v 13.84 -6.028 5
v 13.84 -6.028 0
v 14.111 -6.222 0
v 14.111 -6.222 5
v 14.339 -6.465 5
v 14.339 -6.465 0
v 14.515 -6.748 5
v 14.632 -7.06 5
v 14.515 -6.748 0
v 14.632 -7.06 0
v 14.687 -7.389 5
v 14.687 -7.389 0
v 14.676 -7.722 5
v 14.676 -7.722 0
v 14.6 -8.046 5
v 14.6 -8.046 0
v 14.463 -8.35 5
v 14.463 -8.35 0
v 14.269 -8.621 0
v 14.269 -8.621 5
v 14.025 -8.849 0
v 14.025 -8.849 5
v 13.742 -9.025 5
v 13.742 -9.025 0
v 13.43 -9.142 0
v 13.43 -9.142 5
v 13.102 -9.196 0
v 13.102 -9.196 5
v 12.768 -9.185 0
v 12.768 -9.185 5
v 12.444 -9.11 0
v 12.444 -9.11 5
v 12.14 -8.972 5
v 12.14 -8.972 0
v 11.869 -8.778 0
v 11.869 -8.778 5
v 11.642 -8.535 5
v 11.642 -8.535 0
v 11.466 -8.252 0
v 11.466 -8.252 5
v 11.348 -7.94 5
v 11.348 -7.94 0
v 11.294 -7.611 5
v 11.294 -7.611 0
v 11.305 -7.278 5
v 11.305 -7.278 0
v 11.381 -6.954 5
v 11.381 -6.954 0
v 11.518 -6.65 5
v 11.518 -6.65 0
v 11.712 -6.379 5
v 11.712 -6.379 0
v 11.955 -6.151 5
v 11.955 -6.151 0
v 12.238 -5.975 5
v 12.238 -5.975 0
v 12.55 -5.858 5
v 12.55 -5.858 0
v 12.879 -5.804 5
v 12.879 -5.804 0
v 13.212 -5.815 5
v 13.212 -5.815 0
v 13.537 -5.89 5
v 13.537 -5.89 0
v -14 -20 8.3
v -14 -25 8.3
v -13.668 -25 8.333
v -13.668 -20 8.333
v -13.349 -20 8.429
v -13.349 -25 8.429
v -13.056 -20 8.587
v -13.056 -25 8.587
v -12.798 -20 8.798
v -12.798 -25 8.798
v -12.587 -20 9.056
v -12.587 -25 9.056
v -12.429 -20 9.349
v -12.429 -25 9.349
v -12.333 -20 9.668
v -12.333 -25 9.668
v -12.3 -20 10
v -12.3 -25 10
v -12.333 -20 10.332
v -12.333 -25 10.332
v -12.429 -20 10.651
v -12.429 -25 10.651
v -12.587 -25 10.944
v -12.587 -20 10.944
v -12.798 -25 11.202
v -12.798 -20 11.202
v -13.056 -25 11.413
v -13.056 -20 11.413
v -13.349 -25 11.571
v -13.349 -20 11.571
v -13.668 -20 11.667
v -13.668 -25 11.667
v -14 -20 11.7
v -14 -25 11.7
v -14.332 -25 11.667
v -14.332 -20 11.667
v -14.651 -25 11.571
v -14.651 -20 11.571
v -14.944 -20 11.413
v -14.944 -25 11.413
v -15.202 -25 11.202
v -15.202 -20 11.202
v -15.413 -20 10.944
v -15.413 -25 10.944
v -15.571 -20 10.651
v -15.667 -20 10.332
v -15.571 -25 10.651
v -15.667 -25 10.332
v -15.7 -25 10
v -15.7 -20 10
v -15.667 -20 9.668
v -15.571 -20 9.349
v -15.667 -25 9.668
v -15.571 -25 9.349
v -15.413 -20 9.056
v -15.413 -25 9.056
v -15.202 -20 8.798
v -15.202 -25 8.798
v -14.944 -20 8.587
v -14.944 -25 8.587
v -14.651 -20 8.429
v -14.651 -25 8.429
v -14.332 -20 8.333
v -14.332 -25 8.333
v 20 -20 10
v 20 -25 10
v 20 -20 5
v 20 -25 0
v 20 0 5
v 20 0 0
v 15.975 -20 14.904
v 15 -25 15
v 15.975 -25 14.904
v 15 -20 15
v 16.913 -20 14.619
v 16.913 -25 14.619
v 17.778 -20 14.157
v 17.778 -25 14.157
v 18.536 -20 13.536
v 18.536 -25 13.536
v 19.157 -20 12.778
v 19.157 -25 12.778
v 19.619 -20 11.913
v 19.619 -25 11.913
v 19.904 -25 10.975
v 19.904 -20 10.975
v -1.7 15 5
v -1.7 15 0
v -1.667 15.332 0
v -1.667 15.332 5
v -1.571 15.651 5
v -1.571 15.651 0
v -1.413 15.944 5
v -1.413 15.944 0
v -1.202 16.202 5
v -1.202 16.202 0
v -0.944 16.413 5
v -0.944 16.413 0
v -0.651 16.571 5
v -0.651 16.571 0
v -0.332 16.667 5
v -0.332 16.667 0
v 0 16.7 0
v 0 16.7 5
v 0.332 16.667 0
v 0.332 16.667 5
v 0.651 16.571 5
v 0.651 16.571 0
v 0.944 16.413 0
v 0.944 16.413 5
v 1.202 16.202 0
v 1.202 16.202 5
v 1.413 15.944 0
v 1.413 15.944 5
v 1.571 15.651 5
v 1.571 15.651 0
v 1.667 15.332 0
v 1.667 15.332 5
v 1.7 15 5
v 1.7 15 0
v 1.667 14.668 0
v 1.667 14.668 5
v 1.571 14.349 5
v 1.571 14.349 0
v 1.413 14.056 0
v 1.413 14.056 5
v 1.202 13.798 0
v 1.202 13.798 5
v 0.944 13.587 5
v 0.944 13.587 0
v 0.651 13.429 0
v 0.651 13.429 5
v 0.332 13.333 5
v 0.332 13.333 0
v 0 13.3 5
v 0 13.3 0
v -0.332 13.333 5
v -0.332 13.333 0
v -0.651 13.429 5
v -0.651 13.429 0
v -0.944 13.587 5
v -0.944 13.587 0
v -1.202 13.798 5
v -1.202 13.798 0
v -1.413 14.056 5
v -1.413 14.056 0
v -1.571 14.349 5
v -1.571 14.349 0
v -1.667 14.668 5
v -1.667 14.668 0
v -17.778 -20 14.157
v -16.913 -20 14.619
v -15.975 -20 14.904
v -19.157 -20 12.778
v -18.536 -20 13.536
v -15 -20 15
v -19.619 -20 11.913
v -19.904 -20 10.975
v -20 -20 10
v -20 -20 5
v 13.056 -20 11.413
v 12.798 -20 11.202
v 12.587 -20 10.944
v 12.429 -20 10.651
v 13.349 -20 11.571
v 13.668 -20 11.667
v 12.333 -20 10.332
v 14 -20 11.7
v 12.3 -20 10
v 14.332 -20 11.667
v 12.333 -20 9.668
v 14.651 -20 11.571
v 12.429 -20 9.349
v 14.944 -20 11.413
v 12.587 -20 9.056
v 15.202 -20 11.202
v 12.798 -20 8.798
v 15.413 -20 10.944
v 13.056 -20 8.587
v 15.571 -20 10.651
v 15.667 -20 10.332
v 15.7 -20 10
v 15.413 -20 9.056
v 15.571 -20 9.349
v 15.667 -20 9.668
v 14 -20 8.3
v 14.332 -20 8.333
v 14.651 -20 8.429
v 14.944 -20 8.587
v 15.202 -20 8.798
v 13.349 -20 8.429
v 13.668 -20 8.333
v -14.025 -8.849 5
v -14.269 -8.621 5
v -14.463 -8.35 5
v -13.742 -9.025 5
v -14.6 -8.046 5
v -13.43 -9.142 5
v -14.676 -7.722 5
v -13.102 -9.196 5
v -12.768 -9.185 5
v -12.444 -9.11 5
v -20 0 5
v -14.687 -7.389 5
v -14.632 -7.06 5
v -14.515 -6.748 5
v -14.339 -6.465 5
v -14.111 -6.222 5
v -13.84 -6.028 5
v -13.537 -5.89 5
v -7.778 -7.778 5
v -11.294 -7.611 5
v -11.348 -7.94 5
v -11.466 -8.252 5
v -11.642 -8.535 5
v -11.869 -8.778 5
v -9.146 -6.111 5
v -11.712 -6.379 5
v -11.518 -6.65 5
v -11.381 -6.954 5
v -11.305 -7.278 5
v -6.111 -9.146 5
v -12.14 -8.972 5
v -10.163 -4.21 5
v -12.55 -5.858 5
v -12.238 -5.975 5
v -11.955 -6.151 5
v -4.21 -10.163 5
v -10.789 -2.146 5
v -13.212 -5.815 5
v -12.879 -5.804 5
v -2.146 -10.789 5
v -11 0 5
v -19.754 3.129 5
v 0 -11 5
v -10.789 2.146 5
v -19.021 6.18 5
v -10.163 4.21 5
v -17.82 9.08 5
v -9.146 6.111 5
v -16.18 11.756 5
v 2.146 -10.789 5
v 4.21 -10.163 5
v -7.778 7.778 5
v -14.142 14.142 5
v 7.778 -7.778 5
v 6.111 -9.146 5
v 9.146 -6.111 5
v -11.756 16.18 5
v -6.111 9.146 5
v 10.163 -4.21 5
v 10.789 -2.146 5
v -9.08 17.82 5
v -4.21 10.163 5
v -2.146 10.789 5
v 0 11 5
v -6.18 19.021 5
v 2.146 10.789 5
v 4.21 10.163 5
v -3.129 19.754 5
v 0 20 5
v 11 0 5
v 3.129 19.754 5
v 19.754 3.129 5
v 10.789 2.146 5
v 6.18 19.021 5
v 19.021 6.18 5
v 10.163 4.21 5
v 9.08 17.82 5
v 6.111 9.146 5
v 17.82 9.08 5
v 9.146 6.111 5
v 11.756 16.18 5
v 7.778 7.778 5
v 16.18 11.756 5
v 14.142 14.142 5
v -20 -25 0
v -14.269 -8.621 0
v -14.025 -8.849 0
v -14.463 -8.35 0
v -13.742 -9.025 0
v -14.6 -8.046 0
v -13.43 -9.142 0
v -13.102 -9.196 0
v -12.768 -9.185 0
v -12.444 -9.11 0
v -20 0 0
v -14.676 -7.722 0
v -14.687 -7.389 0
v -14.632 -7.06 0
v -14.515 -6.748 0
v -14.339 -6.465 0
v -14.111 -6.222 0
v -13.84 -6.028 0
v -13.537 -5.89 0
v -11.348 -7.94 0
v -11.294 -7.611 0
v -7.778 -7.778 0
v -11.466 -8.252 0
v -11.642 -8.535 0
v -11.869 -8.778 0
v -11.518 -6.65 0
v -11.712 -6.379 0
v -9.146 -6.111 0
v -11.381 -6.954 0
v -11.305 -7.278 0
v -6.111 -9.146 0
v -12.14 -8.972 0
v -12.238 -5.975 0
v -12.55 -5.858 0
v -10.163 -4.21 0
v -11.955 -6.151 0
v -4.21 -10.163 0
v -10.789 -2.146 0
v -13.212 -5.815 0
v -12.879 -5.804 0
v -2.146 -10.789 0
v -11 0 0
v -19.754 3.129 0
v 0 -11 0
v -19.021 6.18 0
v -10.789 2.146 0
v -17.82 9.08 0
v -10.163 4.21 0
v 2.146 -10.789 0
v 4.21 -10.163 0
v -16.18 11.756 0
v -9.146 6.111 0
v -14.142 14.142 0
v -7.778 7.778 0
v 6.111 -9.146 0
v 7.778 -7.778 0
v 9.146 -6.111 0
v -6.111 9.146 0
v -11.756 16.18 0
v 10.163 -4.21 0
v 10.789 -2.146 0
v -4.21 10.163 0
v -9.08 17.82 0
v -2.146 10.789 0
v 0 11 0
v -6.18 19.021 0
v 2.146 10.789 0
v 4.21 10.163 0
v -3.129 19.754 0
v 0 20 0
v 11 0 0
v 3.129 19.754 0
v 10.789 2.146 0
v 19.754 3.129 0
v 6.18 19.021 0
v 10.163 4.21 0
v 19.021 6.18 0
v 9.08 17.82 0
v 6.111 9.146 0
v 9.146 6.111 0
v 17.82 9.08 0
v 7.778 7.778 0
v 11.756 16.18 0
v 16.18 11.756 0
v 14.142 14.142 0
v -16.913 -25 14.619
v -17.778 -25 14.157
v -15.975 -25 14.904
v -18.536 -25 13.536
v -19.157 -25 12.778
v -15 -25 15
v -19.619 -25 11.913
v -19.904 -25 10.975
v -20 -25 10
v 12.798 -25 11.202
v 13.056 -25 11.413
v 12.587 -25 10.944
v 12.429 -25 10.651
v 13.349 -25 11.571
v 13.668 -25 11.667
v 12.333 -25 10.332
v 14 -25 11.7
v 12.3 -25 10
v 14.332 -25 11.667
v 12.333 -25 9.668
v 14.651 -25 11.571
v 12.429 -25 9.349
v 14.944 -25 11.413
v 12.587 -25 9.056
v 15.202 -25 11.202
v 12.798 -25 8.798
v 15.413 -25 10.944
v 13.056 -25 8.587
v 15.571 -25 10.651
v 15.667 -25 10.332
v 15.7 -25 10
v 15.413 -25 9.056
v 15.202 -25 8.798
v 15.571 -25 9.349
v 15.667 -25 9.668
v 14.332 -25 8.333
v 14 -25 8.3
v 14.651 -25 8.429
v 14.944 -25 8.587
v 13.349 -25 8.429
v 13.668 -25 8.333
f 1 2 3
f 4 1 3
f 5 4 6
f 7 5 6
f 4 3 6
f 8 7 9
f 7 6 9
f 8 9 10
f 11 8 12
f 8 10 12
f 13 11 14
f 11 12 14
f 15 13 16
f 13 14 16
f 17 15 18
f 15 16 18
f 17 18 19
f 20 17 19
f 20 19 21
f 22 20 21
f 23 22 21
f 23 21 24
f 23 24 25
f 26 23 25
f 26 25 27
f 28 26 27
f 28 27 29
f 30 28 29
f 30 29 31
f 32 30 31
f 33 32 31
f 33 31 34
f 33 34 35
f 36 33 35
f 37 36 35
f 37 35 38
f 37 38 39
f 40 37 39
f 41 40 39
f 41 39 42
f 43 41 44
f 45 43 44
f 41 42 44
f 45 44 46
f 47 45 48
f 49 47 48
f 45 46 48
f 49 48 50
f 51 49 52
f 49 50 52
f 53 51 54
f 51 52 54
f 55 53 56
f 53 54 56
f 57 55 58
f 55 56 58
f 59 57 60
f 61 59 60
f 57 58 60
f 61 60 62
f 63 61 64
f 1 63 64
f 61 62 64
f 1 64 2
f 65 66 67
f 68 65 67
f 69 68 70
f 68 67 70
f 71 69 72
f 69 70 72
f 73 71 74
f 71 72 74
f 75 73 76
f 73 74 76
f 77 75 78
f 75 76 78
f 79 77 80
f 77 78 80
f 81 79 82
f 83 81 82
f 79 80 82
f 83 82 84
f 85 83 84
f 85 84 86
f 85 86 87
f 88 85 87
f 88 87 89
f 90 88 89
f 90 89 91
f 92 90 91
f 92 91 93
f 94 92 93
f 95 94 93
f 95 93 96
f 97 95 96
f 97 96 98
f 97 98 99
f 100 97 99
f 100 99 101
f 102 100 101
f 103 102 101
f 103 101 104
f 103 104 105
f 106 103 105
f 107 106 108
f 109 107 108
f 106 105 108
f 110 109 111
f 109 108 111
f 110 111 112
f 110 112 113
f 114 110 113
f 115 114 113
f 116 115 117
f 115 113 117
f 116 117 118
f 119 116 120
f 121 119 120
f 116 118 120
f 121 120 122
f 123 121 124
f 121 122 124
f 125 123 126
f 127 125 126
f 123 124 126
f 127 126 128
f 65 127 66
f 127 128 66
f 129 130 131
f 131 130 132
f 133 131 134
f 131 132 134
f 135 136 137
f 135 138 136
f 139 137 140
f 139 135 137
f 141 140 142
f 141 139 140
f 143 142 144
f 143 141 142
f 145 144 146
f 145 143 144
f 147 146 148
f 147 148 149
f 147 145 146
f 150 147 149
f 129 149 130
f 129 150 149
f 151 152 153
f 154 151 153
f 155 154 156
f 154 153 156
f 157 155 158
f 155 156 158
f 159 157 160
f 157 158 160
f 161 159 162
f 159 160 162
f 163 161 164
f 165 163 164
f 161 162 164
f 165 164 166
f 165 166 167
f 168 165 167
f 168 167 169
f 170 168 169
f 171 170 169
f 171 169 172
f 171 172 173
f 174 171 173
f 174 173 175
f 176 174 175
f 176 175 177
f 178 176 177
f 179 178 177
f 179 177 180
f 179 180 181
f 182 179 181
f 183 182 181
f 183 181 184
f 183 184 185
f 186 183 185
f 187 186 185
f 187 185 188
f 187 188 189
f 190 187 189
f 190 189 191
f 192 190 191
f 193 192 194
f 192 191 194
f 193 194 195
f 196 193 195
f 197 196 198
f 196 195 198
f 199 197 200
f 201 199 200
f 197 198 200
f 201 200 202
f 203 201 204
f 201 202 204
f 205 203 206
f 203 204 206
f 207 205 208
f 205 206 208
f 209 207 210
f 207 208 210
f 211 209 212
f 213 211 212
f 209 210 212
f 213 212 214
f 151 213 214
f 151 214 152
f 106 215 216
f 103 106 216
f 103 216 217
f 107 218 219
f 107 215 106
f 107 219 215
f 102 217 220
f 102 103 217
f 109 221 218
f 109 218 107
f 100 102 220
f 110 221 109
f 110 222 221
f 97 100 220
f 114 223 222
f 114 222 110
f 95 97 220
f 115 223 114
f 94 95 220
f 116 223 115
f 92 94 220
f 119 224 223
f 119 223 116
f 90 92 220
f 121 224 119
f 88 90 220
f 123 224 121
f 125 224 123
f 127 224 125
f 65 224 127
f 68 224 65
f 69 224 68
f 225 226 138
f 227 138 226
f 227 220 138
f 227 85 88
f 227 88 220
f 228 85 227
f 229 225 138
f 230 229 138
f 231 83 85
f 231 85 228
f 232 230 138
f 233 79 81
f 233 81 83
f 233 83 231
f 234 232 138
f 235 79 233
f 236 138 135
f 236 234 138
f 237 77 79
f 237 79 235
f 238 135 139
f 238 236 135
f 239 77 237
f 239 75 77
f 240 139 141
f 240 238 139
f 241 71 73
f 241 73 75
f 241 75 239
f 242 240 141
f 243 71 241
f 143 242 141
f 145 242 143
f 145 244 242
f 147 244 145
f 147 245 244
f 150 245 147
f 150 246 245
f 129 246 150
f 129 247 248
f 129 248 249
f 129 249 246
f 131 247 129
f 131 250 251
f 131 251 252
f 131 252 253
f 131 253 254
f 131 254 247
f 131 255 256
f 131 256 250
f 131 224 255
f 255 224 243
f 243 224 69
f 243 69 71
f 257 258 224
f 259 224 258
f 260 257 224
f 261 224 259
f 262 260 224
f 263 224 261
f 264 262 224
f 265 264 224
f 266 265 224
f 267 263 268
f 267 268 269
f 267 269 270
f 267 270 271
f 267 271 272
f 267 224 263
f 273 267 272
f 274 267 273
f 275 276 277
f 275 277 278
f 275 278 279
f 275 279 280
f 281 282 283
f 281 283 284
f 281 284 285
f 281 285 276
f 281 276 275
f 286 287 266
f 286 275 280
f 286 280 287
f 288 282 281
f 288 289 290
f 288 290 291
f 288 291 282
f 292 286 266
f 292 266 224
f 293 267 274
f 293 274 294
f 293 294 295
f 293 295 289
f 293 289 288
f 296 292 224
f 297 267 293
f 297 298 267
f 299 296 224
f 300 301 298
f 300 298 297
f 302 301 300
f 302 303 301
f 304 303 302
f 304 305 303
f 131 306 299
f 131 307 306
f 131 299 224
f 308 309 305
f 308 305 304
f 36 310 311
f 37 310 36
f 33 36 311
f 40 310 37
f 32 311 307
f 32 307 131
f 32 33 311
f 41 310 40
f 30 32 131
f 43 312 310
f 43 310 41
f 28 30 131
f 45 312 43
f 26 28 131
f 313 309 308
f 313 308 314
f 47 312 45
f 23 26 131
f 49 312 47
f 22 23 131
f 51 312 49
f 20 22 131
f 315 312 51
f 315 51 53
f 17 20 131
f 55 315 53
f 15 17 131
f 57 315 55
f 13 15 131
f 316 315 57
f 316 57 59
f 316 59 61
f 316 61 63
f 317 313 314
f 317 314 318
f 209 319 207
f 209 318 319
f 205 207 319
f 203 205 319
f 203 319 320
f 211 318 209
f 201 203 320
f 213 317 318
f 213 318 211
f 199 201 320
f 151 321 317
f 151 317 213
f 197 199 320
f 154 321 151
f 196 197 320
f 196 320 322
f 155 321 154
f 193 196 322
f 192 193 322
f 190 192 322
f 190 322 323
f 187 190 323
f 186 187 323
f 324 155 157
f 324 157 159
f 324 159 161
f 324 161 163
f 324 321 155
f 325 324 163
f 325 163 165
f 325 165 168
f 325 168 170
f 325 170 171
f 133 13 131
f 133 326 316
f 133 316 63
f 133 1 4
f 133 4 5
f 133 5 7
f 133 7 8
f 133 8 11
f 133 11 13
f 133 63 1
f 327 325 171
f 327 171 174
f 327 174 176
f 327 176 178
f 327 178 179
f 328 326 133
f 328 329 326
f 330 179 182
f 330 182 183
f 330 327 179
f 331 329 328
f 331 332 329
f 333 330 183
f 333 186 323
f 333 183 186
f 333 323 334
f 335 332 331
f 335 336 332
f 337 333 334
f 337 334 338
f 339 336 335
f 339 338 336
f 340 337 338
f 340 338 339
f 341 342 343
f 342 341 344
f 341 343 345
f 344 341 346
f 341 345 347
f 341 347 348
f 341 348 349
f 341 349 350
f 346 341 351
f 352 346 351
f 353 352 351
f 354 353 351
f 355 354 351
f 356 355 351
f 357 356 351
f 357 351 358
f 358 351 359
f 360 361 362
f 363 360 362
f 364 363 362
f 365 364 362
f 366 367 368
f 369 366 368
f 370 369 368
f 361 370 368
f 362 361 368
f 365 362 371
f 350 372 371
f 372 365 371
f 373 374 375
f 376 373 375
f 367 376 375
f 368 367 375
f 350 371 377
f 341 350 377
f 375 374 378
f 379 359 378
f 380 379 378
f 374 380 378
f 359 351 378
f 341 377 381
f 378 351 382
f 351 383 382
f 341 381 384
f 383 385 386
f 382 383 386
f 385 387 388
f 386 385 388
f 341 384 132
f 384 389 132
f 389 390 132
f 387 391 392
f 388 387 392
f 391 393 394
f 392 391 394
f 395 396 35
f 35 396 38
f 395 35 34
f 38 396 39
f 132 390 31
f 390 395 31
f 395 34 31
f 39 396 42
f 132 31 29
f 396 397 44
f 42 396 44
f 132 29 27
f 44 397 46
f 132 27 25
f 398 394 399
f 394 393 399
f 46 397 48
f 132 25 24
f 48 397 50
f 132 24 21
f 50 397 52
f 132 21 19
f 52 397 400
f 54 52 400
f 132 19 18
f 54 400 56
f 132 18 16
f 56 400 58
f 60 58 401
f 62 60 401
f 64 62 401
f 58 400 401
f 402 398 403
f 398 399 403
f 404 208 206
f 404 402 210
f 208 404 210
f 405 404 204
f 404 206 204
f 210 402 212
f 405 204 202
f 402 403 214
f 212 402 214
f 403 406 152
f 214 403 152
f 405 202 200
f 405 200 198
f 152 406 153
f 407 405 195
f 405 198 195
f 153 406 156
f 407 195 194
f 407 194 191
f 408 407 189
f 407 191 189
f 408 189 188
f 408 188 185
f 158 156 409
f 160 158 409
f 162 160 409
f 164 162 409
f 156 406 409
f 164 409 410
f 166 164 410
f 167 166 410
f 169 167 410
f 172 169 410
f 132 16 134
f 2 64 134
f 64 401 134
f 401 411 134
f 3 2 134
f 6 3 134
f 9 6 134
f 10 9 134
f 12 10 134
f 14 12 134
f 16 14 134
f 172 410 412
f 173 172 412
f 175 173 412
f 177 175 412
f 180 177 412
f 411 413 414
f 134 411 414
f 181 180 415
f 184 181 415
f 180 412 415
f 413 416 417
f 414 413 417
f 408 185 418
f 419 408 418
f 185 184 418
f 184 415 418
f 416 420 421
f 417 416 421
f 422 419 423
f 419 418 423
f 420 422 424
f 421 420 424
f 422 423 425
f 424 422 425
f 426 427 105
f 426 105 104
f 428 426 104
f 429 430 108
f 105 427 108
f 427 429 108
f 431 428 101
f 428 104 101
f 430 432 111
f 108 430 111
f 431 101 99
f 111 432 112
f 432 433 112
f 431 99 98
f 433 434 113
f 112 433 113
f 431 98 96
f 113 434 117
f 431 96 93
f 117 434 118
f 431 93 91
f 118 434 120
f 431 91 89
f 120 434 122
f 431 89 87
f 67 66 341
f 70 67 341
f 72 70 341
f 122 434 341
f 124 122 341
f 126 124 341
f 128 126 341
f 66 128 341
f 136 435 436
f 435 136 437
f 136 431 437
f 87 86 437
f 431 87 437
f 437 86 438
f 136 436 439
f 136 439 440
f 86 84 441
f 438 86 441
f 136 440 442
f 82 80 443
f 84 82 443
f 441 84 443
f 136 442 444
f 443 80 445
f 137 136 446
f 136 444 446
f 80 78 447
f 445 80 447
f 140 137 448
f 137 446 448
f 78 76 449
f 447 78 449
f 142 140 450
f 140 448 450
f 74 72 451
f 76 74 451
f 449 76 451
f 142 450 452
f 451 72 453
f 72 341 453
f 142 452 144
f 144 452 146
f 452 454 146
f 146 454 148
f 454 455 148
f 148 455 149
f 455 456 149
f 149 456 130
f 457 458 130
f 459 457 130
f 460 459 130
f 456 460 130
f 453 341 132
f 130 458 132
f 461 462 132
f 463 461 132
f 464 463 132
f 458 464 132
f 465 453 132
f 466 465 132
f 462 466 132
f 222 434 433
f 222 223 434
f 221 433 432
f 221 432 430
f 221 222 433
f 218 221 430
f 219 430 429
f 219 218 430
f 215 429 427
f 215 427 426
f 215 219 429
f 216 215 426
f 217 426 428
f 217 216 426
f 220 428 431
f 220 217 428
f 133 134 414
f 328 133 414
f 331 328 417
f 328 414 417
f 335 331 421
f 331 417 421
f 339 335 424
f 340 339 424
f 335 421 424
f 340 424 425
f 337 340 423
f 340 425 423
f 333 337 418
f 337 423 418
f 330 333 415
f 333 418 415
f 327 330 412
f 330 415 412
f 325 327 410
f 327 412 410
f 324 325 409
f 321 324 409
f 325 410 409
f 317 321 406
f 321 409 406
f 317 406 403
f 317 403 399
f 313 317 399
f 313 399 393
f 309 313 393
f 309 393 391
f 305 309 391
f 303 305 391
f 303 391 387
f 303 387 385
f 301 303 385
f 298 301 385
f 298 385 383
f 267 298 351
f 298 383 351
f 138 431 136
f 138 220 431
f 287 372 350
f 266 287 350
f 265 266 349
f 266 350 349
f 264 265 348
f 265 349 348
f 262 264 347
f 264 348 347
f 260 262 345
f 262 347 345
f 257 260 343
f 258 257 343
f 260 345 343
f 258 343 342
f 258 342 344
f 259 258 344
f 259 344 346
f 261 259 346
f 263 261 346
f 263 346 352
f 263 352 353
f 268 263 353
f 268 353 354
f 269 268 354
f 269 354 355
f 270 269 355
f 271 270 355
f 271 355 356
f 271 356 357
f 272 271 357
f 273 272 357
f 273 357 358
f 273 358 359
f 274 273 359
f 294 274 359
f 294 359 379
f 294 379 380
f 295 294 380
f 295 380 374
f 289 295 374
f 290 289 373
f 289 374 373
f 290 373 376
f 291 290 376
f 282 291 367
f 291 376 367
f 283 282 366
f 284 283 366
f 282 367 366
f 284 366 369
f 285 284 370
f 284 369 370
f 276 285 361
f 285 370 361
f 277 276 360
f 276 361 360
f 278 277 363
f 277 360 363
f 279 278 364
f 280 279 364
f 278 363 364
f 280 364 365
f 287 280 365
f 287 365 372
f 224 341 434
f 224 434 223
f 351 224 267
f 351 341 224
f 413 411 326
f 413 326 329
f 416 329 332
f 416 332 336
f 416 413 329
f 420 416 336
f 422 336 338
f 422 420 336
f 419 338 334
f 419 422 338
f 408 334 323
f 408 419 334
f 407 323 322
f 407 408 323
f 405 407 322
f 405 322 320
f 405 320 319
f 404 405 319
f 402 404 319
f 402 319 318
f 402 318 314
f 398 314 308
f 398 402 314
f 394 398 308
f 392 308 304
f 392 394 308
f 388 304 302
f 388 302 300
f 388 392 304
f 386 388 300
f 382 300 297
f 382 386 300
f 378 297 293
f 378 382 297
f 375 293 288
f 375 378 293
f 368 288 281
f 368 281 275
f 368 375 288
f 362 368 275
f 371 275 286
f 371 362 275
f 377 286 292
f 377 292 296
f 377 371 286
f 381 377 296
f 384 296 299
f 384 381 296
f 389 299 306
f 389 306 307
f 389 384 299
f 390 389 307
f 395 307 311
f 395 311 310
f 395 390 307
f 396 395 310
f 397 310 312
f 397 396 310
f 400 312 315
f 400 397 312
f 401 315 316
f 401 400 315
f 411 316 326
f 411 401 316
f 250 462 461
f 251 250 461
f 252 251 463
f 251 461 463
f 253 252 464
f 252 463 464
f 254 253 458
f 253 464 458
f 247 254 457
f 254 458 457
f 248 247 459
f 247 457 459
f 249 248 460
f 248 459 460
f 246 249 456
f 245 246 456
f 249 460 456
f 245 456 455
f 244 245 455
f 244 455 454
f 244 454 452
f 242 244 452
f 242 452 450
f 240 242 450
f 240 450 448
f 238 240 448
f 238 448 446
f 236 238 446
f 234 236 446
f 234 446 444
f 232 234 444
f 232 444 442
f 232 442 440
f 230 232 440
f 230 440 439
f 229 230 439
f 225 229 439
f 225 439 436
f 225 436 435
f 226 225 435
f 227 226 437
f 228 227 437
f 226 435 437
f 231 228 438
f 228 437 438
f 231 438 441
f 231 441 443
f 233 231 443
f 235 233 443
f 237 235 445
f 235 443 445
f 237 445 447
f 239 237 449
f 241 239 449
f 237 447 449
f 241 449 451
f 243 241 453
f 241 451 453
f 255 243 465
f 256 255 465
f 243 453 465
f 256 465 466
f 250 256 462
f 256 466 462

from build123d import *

# Parameters (mm, degrees)
SKETCH1_R            = 11
BOSS_EXTRUDE1_DEPTH  = 5
M3_CLEARANCE_HOLE1_D = 3.4
CIRPATTERN1_COUNT    = 3
SKETCH5_W            = 40
SKETCH5_H            = 5
BOSS_EXTRUDE2_DEPTH  = 15
M3_CLEARANCE_HOLE3_D = 3.4
FILLET1_R            = 5


with BuildPart() as part:
    # Sketch1 → Boss-Extrude1 (new body)
    with BuildSketch(Plane.XY):
        with BuildLine():
            Line((-20, -4.3e-08), (-20, -20))
            Line((-20, -20), (20, -20))
            Line((20, -20), (20, 0))
            ThreePointArc((20, 0), (-2.2e-08, 20), (-20, -4.3e-08))
        make_face()
        Circle(SKETCH1_R, mode=Mode.SUBTRACT)
    extrude(amount=BOSS_EXTRUDE1_DEPTH)

    # M3 Clearance Hole1 (through all)
    with Locations(Plane(origin=(0, 15, 5), x_dir=(1, 0, 0), z_dir=(0, 0, 1))):
        with Locations((0, 0)):
            m3_clearance_hole1 = Hole(M3_CLEARANCE_HOLE1_D / 2)

    # CirPattern1: M3 Clearance Hole1 ×3 about axis
    cirpattern1_axis = Axis((0, 0, 0), (0, 0, 1))
    for i in range(1, CIRPATTERN1_COUNT):
        add(m3_clearance_hole1.rotate(cirpattern1_axis, i * 360 / CIRPATTERN1_COUNT), mode=Mode.SUBTRACT)

    # Sketch5 → Boss-Extrude2 (add)
    with BuildSketch(Plane.XY):
        with Locations((0, -22.5)):
            Rectangle(SKETCH5_W, SKETCH5_H)
    extrude(amount=BOSS_EXTRUDE2_DEPTH)

    # M3 Clearance Hole3 (through all)
    with Locations(Plane(origin=(-14, -20, 10), x_dir=(0, 0, 1), z_dir=(0, 1, 0))):
        with Locations((0, 0), (0, 28)):
            Hole(M3_CLEARANCE_HOLE3_D / 2)

    # Fillet1
    fillet1_edges = [part.edges().sort_by_distance(p)[0] for p in [
        (-20, -22.5, 15),
        (20, -22.5, 15),
    ]]
    fillet(fillet1_edges, radius=FILLET1_R)


solid = part.part
